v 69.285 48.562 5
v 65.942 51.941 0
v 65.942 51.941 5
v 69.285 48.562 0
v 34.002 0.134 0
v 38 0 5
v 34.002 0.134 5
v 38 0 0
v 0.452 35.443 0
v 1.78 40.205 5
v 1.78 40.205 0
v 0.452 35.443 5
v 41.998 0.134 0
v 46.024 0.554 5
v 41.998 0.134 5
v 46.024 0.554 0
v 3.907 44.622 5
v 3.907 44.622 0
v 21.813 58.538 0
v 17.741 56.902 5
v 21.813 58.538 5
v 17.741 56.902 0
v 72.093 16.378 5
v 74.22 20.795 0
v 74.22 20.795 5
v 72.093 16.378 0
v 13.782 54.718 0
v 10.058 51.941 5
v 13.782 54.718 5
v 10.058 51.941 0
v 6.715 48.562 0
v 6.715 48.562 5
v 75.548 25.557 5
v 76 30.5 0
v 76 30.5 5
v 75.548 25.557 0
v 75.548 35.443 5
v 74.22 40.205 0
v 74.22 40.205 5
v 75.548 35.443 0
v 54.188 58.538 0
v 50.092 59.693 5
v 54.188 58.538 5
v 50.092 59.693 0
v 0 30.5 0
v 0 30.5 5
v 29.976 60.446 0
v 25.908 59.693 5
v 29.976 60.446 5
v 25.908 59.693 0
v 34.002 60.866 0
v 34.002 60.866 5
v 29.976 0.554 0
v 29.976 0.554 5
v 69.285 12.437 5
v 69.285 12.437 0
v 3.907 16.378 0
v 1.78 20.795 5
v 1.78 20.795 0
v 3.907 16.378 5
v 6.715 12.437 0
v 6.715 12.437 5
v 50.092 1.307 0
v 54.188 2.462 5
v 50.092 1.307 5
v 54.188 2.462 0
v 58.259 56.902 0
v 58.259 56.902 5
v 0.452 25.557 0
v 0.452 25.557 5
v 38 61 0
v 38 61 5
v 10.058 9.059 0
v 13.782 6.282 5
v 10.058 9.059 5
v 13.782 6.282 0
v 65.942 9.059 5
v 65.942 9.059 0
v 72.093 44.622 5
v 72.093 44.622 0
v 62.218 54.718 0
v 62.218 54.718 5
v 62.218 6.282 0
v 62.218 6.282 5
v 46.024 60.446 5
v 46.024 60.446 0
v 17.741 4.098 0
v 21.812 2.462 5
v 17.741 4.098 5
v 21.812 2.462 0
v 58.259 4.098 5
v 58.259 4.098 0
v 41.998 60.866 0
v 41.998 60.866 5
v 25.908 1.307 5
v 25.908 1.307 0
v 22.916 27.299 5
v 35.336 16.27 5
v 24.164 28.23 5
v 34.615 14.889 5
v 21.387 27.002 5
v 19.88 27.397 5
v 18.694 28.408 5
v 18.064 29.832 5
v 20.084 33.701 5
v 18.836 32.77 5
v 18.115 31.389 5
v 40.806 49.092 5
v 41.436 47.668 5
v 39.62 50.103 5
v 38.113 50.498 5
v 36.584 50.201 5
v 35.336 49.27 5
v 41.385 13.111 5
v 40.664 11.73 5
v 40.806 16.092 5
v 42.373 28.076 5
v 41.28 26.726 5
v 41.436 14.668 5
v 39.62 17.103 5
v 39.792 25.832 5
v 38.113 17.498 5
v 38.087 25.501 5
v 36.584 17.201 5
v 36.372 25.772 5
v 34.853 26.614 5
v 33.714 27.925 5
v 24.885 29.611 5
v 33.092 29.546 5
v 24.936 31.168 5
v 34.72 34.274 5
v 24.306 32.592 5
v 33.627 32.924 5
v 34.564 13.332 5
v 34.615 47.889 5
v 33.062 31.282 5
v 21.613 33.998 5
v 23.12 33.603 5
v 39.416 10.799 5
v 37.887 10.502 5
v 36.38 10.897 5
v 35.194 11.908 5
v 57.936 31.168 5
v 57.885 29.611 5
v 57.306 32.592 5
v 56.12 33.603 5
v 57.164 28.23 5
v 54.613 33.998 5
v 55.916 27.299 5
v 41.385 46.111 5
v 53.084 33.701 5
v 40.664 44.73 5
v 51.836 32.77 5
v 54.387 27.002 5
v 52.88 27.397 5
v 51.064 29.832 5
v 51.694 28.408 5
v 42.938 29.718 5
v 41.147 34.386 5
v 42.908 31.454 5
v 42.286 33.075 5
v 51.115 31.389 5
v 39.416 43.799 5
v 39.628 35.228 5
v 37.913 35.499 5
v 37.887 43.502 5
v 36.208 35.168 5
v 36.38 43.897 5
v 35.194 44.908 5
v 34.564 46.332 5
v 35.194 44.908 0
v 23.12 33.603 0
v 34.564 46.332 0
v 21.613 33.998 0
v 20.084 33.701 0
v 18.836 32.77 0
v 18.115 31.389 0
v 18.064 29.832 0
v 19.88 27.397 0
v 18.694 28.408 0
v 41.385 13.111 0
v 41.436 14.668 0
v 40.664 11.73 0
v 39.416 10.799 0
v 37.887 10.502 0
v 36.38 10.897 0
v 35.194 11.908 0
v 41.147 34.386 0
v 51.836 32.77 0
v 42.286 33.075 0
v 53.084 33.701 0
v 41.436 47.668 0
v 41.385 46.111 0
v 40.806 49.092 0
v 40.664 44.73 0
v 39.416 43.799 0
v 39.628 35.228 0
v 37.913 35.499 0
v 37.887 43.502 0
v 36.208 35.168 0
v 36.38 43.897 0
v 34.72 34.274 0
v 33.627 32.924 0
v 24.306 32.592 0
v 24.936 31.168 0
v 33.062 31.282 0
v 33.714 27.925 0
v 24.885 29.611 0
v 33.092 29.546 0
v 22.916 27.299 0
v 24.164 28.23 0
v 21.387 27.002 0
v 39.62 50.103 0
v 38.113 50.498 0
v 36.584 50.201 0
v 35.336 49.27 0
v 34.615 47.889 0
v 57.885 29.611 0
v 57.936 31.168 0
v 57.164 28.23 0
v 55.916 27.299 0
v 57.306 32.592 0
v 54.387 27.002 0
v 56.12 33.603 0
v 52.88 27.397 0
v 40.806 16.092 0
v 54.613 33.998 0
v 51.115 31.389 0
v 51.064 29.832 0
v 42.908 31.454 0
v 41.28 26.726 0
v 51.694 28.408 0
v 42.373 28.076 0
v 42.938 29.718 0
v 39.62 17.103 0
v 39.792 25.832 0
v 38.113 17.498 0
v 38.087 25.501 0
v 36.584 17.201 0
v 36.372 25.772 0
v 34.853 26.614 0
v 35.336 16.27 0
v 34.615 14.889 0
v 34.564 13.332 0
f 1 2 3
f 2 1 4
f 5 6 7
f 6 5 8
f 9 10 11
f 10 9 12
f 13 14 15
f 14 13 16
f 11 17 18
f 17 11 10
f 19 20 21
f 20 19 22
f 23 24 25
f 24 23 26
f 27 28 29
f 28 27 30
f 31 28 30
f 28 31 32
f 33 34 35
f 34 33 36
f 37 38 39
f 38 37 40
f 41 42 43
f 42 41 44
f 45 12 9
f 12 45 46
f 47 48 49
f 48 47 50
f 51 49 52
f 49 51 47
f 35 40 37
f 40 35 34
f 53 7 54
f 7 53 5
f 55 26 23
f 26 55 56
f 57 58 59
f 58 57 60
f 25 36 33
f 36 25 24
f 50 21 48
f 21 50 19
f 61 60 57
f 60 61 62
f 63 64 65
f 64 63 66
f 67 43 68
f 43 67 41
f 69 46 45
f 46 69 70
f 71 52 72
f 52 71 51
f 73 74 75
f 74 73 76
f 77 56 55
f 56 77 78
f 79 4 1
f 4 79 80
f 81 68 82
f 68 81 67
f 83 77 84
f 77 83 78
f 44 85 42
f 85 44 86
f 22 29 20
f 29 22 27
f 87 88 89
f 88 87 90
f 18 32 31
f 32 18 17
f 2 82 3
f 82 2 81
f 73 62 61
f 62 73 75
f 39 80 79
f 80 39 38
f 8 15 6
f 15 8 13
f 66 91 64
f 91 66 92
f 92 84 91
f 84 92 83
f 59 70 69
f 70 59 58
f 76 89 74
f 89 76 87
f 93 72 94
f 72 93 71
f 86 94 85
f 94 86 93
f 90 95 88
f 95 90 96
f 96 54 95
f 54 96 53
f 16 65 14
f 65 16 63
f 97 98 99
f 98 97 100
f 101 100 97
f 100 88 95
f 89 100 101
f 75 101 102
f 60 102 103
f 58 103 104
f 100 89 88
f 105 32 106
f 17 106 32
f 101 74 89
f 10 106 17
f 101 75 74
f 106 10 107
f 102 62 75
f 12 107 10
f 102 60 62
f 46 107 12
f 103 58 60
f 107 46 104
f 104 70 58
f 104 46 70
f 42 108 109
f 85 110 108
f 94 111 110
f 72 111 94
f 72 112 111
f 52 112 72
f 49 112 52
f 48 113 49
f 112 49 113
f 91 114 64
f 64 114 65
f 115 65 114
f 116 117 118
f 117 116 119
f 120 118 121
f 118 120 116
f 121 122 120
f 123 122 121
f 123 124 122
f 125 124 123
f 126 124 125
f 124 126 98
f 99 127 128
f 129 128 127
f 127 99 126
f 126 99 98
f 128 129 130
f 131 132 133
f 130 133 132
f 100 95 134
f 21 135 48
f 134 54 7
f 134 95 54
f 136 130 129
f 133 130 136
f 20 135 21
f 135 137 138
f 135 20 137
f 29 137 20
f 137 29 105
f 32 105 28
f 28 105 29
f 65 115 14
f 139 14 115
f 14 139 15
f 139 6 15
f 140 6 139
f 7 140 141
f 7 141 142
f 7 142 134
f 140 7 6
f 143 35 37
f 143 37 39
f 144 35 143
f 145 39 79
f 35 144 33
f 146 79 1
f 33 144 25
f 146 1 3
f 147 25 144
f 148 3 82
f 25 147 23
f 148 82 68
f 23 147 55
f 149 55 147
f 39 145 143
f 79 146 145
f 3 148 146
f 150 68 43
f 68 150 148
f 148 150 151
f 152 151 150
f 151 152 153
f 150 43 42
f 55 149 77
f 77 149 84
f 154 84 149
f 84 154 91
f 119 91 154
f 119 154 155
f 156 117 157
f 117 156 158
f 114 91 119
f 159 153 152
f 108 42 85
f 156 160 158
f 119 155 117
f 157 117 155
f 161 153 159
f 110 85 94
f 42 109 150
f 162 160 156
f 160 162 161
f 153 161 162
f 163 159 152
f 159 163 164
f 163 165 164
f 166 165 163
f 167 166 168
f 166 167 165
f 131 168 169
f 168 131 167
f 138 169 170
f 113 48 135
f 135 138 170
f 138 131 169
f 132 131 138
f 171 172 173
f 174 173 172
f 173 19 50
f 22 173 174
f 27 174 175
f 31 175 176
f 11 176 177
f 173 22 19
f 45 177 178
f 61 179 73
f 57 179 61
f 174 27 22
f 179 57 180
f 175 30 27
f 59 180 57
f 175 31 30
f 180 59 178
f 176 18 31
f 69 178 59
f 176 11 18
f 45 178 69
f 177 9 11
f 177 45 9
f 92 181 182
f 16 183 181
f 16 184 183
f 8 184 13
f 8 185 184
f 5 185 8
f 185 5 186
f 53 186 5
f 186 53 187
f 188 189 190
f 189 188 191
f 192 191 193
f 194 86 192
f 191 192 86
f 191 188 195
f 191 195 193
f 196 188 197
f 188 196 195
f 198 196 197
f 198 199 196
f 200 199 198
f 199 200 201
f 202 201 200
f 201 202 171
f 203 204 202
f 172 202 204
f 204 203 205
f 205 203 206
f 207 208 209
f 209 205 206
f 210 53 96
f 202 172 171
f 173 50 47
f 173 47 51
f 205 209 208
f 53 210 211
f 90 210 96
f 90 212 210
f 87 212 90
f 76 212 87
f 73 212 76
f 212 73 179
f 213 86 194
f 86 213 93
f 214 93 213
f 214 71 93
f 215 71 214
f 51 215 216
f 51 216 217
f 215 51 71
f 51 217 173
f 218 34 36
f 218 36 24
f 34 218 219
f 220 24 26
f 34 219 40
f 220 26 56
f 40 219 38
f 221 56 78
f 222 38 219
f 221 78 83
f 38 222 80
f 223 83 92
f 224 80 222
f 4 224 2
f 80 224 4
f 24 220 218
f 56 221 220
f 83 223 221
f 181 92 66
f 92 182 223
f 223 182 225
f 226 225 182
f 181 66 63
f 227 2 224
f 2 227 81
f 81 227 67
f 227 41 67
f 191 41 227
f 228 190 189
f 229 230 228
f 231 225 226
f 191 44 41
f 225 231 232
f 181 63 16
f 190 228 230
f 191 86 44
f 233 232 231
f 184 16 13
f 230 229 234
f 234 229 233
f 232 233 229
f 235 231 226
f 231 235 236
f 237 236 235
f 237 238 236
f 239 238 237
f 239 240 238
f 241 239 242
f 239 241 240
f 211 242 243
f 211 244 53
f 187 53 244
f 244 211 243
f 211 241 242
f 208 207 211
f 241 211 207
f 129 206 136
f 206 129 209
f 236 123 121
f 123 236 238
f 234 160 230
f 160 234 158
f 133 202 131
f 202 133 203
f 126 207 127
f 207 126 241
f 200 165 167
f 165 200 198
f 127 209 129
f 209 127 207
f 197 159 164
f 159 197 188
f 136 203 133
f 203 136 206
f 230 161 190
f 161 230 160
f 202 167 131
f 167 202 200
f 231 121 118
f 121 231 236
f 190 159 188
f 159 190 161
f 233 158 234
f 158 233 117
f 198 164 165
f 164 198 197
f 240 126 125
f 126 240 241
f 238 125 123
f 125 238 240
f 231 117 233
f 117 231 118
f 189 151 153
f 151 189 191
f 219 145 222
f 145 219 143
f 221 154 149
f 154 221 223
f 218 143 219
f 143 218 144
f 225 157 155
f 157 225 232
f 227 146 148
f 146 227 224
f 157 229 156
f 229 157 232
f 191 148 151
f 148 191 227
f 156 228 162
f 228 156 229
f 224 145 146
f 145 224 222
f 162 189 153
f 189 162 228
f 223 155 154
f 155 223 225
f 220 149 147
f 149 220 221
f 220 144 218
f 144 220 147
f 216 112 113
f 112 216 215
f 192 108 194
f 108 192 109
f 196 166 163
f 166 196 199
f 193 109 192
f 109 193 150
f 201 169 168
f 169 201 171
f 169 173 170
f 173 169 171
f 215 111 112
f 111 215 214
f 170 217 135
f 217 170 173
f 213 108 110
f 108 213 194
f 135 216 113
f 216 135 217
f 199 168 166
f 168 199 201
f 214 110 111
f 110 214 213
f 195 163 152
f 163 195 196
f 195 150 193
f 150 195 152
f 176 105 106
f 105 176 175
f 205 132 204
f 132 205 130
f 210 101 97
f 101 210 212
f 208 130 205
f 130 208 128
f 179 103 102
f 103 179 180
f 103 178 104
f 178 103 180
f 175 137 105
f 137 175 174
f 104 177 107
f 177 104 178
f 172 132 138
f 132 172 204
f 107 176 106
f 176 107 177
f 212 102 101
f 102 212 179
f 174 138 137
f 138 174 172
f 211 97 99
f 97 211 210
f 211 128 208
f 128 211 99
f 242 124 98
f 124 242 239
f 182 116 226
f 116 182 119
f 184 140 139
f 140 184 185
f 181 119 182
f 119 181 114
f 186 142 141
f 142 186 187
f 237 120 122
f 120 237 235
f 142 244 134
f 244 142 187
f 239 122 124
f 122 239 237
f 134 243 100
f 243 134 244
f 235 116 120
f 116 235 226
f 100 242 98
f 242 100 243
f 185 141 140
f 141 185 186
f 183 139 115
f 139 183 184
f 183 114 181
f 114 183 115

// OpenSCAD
$fn = 32;

// ----------------------------------------------------------------------
// Cam plate: double_lobe cam, base R28
// ----------------------------------------------------------------------

// --- parameters (mm) ---
base_r = 28;              // base circle radius
lobe_h = 10;              // cam lobe rise
bore_r = 5;               // shaft bore radius
plate_t = 5;              // plate thickness, Z (extrusion height)
ring_r = 16.5;            // lightening ring radius
bolt_r = 3.5;             // lightening hole radius

profile = [[76, 30.5], [75.548, 35.443], [74.22, 40.205], [72.093, 44.622], [69.285, 48.562], [65.942, 51.941], [62.218, 54.718], [58.259, 56.902], [54.188, 58.538], [50.092, 59.693], [46.024, 60.446], [41.998, 60.866], [38, 61], [34.002, 60.866], [29.976, 60.446], [25.908, 59.693], [21.813, 58.538], [17.741, 56.902], [13.782, 54.718], [10.058, 51.941], [6.715, 48.562], [3.907, 44.622], [1.78, 40.205], [0.452, 35.443], [0, 30.5], [0.452, 25.557], [1.78, 20.795], [3.907, 16.378], [6.715, 12.437], [10.058, 9.059], [13.782, 6.282], [17.741, 4.098], [21.812, 2.462], [25.908, 1.307], [29.976, 0.554], [34.002, 0.134], [38, 0], [41.998, 0.134], [46.024, 0.554], [50.092, 1.307], [54.188, 2.462], [58.259, 4.098], [62.218, 6.282], [65.942, 9.059], [69.285, 12.437], [72.093, 16.378], [74.22, 20.795], [75.548, 25.557]];  // primary outline, 48 points, counter clockwise
void_1 = [[42.908, 31.454], [42.286, 33.075], [41.147, 34.386], [39.628, 35.228], [37.913, 35.499], [36.208, 35.168], [34.72, 34.274], [33.627, 32.924], [33.062, 31.282], [33.092, 29.546], [33.714, 27.925], [34.853, 26.614], [36.372, 25.772], [38.087, 25.501], [39.792, 25.832], [41.28, 26.726], [42.373, 28.076], [42.938, 29.718]];  // shaft bore, 18 points
void_2 = [[57.936, 31.168], [57.306, 32.592], [56.12, 33.603], [54.613, 33.998], [53.084, 33.701], [51.836, 32.77], [51.115, 31.389], [51.064, 29.832], [51.694, 28.408], [52.88, 27.397], [54.387, 27.002], [55.916, 27.299], [57.164, 28.23], [57.885, 29.611]];  // lightening hole 1, 14 points
void_3 = [[41.436, 47.668], [40.806, 49.092], [39.62, 50.103], [38.113, 50.498], [36.584, 50.201], [35.336, 49.27], [34.615, 47.889], [34.564, 46.332], [35.194, 44.908], [36.38, 43.897], [37.887, 43.502], [39.416, 43.799], [40.664, 44.73], [41.385, 46.111]];  // lightening hole 2, 14 points
void_4 = [[24.936, 31.168], [24.306, 32.592], [23.12, 33.603], [21.613, 33.998], [20.084, 33.701], [18.836, 32.77], [18.115, 31.389], [18.064, 29.832], [18.694, 28.408], [19.88, 27.397], [21.387, 27.002], [22.916, 27.299], [24.164, 28.23], [24.885, 29.611]];  // lightening hole 3, 14 points
void_5 = [[41.436, 14.668], [40.806, 16.092], [39.62, 17.103], [38.113, 17.498], [36.584, 17.201], [35.336, 16.27], [34.615, 14.889], [34.564, 13.332], [35.194, 11.908], [36.38, 10.897], [37.887, 10.502], [39.416, 10.799], [40.664, 11.73], [41.385, 13.111]];  // lightening hole 4, 14 points

// --- the one profile operation ---
difference() {
  linear_extrude(height = plate_t) polygon(points = profile);
  translate([0, 0, -1])
    linear_extrude(height = plate_t + 2) polygon(points = void_1);
  translate([0, 0, -1])
    linear_extrude(height = plate_t + 2) polygon(points = void_2);
  translate([0, 0, -1])
    linear_extrude(height = plate_t + 2) polygon(points = void_3);
  translate([0, 0, -1])
    linear_extrude(height = plate_t + 2) polygon(points = void_4);
  translate([0, 0, -1])
    linear_extrude(height = plate_t + 2) polygon(points = void_5);
}
